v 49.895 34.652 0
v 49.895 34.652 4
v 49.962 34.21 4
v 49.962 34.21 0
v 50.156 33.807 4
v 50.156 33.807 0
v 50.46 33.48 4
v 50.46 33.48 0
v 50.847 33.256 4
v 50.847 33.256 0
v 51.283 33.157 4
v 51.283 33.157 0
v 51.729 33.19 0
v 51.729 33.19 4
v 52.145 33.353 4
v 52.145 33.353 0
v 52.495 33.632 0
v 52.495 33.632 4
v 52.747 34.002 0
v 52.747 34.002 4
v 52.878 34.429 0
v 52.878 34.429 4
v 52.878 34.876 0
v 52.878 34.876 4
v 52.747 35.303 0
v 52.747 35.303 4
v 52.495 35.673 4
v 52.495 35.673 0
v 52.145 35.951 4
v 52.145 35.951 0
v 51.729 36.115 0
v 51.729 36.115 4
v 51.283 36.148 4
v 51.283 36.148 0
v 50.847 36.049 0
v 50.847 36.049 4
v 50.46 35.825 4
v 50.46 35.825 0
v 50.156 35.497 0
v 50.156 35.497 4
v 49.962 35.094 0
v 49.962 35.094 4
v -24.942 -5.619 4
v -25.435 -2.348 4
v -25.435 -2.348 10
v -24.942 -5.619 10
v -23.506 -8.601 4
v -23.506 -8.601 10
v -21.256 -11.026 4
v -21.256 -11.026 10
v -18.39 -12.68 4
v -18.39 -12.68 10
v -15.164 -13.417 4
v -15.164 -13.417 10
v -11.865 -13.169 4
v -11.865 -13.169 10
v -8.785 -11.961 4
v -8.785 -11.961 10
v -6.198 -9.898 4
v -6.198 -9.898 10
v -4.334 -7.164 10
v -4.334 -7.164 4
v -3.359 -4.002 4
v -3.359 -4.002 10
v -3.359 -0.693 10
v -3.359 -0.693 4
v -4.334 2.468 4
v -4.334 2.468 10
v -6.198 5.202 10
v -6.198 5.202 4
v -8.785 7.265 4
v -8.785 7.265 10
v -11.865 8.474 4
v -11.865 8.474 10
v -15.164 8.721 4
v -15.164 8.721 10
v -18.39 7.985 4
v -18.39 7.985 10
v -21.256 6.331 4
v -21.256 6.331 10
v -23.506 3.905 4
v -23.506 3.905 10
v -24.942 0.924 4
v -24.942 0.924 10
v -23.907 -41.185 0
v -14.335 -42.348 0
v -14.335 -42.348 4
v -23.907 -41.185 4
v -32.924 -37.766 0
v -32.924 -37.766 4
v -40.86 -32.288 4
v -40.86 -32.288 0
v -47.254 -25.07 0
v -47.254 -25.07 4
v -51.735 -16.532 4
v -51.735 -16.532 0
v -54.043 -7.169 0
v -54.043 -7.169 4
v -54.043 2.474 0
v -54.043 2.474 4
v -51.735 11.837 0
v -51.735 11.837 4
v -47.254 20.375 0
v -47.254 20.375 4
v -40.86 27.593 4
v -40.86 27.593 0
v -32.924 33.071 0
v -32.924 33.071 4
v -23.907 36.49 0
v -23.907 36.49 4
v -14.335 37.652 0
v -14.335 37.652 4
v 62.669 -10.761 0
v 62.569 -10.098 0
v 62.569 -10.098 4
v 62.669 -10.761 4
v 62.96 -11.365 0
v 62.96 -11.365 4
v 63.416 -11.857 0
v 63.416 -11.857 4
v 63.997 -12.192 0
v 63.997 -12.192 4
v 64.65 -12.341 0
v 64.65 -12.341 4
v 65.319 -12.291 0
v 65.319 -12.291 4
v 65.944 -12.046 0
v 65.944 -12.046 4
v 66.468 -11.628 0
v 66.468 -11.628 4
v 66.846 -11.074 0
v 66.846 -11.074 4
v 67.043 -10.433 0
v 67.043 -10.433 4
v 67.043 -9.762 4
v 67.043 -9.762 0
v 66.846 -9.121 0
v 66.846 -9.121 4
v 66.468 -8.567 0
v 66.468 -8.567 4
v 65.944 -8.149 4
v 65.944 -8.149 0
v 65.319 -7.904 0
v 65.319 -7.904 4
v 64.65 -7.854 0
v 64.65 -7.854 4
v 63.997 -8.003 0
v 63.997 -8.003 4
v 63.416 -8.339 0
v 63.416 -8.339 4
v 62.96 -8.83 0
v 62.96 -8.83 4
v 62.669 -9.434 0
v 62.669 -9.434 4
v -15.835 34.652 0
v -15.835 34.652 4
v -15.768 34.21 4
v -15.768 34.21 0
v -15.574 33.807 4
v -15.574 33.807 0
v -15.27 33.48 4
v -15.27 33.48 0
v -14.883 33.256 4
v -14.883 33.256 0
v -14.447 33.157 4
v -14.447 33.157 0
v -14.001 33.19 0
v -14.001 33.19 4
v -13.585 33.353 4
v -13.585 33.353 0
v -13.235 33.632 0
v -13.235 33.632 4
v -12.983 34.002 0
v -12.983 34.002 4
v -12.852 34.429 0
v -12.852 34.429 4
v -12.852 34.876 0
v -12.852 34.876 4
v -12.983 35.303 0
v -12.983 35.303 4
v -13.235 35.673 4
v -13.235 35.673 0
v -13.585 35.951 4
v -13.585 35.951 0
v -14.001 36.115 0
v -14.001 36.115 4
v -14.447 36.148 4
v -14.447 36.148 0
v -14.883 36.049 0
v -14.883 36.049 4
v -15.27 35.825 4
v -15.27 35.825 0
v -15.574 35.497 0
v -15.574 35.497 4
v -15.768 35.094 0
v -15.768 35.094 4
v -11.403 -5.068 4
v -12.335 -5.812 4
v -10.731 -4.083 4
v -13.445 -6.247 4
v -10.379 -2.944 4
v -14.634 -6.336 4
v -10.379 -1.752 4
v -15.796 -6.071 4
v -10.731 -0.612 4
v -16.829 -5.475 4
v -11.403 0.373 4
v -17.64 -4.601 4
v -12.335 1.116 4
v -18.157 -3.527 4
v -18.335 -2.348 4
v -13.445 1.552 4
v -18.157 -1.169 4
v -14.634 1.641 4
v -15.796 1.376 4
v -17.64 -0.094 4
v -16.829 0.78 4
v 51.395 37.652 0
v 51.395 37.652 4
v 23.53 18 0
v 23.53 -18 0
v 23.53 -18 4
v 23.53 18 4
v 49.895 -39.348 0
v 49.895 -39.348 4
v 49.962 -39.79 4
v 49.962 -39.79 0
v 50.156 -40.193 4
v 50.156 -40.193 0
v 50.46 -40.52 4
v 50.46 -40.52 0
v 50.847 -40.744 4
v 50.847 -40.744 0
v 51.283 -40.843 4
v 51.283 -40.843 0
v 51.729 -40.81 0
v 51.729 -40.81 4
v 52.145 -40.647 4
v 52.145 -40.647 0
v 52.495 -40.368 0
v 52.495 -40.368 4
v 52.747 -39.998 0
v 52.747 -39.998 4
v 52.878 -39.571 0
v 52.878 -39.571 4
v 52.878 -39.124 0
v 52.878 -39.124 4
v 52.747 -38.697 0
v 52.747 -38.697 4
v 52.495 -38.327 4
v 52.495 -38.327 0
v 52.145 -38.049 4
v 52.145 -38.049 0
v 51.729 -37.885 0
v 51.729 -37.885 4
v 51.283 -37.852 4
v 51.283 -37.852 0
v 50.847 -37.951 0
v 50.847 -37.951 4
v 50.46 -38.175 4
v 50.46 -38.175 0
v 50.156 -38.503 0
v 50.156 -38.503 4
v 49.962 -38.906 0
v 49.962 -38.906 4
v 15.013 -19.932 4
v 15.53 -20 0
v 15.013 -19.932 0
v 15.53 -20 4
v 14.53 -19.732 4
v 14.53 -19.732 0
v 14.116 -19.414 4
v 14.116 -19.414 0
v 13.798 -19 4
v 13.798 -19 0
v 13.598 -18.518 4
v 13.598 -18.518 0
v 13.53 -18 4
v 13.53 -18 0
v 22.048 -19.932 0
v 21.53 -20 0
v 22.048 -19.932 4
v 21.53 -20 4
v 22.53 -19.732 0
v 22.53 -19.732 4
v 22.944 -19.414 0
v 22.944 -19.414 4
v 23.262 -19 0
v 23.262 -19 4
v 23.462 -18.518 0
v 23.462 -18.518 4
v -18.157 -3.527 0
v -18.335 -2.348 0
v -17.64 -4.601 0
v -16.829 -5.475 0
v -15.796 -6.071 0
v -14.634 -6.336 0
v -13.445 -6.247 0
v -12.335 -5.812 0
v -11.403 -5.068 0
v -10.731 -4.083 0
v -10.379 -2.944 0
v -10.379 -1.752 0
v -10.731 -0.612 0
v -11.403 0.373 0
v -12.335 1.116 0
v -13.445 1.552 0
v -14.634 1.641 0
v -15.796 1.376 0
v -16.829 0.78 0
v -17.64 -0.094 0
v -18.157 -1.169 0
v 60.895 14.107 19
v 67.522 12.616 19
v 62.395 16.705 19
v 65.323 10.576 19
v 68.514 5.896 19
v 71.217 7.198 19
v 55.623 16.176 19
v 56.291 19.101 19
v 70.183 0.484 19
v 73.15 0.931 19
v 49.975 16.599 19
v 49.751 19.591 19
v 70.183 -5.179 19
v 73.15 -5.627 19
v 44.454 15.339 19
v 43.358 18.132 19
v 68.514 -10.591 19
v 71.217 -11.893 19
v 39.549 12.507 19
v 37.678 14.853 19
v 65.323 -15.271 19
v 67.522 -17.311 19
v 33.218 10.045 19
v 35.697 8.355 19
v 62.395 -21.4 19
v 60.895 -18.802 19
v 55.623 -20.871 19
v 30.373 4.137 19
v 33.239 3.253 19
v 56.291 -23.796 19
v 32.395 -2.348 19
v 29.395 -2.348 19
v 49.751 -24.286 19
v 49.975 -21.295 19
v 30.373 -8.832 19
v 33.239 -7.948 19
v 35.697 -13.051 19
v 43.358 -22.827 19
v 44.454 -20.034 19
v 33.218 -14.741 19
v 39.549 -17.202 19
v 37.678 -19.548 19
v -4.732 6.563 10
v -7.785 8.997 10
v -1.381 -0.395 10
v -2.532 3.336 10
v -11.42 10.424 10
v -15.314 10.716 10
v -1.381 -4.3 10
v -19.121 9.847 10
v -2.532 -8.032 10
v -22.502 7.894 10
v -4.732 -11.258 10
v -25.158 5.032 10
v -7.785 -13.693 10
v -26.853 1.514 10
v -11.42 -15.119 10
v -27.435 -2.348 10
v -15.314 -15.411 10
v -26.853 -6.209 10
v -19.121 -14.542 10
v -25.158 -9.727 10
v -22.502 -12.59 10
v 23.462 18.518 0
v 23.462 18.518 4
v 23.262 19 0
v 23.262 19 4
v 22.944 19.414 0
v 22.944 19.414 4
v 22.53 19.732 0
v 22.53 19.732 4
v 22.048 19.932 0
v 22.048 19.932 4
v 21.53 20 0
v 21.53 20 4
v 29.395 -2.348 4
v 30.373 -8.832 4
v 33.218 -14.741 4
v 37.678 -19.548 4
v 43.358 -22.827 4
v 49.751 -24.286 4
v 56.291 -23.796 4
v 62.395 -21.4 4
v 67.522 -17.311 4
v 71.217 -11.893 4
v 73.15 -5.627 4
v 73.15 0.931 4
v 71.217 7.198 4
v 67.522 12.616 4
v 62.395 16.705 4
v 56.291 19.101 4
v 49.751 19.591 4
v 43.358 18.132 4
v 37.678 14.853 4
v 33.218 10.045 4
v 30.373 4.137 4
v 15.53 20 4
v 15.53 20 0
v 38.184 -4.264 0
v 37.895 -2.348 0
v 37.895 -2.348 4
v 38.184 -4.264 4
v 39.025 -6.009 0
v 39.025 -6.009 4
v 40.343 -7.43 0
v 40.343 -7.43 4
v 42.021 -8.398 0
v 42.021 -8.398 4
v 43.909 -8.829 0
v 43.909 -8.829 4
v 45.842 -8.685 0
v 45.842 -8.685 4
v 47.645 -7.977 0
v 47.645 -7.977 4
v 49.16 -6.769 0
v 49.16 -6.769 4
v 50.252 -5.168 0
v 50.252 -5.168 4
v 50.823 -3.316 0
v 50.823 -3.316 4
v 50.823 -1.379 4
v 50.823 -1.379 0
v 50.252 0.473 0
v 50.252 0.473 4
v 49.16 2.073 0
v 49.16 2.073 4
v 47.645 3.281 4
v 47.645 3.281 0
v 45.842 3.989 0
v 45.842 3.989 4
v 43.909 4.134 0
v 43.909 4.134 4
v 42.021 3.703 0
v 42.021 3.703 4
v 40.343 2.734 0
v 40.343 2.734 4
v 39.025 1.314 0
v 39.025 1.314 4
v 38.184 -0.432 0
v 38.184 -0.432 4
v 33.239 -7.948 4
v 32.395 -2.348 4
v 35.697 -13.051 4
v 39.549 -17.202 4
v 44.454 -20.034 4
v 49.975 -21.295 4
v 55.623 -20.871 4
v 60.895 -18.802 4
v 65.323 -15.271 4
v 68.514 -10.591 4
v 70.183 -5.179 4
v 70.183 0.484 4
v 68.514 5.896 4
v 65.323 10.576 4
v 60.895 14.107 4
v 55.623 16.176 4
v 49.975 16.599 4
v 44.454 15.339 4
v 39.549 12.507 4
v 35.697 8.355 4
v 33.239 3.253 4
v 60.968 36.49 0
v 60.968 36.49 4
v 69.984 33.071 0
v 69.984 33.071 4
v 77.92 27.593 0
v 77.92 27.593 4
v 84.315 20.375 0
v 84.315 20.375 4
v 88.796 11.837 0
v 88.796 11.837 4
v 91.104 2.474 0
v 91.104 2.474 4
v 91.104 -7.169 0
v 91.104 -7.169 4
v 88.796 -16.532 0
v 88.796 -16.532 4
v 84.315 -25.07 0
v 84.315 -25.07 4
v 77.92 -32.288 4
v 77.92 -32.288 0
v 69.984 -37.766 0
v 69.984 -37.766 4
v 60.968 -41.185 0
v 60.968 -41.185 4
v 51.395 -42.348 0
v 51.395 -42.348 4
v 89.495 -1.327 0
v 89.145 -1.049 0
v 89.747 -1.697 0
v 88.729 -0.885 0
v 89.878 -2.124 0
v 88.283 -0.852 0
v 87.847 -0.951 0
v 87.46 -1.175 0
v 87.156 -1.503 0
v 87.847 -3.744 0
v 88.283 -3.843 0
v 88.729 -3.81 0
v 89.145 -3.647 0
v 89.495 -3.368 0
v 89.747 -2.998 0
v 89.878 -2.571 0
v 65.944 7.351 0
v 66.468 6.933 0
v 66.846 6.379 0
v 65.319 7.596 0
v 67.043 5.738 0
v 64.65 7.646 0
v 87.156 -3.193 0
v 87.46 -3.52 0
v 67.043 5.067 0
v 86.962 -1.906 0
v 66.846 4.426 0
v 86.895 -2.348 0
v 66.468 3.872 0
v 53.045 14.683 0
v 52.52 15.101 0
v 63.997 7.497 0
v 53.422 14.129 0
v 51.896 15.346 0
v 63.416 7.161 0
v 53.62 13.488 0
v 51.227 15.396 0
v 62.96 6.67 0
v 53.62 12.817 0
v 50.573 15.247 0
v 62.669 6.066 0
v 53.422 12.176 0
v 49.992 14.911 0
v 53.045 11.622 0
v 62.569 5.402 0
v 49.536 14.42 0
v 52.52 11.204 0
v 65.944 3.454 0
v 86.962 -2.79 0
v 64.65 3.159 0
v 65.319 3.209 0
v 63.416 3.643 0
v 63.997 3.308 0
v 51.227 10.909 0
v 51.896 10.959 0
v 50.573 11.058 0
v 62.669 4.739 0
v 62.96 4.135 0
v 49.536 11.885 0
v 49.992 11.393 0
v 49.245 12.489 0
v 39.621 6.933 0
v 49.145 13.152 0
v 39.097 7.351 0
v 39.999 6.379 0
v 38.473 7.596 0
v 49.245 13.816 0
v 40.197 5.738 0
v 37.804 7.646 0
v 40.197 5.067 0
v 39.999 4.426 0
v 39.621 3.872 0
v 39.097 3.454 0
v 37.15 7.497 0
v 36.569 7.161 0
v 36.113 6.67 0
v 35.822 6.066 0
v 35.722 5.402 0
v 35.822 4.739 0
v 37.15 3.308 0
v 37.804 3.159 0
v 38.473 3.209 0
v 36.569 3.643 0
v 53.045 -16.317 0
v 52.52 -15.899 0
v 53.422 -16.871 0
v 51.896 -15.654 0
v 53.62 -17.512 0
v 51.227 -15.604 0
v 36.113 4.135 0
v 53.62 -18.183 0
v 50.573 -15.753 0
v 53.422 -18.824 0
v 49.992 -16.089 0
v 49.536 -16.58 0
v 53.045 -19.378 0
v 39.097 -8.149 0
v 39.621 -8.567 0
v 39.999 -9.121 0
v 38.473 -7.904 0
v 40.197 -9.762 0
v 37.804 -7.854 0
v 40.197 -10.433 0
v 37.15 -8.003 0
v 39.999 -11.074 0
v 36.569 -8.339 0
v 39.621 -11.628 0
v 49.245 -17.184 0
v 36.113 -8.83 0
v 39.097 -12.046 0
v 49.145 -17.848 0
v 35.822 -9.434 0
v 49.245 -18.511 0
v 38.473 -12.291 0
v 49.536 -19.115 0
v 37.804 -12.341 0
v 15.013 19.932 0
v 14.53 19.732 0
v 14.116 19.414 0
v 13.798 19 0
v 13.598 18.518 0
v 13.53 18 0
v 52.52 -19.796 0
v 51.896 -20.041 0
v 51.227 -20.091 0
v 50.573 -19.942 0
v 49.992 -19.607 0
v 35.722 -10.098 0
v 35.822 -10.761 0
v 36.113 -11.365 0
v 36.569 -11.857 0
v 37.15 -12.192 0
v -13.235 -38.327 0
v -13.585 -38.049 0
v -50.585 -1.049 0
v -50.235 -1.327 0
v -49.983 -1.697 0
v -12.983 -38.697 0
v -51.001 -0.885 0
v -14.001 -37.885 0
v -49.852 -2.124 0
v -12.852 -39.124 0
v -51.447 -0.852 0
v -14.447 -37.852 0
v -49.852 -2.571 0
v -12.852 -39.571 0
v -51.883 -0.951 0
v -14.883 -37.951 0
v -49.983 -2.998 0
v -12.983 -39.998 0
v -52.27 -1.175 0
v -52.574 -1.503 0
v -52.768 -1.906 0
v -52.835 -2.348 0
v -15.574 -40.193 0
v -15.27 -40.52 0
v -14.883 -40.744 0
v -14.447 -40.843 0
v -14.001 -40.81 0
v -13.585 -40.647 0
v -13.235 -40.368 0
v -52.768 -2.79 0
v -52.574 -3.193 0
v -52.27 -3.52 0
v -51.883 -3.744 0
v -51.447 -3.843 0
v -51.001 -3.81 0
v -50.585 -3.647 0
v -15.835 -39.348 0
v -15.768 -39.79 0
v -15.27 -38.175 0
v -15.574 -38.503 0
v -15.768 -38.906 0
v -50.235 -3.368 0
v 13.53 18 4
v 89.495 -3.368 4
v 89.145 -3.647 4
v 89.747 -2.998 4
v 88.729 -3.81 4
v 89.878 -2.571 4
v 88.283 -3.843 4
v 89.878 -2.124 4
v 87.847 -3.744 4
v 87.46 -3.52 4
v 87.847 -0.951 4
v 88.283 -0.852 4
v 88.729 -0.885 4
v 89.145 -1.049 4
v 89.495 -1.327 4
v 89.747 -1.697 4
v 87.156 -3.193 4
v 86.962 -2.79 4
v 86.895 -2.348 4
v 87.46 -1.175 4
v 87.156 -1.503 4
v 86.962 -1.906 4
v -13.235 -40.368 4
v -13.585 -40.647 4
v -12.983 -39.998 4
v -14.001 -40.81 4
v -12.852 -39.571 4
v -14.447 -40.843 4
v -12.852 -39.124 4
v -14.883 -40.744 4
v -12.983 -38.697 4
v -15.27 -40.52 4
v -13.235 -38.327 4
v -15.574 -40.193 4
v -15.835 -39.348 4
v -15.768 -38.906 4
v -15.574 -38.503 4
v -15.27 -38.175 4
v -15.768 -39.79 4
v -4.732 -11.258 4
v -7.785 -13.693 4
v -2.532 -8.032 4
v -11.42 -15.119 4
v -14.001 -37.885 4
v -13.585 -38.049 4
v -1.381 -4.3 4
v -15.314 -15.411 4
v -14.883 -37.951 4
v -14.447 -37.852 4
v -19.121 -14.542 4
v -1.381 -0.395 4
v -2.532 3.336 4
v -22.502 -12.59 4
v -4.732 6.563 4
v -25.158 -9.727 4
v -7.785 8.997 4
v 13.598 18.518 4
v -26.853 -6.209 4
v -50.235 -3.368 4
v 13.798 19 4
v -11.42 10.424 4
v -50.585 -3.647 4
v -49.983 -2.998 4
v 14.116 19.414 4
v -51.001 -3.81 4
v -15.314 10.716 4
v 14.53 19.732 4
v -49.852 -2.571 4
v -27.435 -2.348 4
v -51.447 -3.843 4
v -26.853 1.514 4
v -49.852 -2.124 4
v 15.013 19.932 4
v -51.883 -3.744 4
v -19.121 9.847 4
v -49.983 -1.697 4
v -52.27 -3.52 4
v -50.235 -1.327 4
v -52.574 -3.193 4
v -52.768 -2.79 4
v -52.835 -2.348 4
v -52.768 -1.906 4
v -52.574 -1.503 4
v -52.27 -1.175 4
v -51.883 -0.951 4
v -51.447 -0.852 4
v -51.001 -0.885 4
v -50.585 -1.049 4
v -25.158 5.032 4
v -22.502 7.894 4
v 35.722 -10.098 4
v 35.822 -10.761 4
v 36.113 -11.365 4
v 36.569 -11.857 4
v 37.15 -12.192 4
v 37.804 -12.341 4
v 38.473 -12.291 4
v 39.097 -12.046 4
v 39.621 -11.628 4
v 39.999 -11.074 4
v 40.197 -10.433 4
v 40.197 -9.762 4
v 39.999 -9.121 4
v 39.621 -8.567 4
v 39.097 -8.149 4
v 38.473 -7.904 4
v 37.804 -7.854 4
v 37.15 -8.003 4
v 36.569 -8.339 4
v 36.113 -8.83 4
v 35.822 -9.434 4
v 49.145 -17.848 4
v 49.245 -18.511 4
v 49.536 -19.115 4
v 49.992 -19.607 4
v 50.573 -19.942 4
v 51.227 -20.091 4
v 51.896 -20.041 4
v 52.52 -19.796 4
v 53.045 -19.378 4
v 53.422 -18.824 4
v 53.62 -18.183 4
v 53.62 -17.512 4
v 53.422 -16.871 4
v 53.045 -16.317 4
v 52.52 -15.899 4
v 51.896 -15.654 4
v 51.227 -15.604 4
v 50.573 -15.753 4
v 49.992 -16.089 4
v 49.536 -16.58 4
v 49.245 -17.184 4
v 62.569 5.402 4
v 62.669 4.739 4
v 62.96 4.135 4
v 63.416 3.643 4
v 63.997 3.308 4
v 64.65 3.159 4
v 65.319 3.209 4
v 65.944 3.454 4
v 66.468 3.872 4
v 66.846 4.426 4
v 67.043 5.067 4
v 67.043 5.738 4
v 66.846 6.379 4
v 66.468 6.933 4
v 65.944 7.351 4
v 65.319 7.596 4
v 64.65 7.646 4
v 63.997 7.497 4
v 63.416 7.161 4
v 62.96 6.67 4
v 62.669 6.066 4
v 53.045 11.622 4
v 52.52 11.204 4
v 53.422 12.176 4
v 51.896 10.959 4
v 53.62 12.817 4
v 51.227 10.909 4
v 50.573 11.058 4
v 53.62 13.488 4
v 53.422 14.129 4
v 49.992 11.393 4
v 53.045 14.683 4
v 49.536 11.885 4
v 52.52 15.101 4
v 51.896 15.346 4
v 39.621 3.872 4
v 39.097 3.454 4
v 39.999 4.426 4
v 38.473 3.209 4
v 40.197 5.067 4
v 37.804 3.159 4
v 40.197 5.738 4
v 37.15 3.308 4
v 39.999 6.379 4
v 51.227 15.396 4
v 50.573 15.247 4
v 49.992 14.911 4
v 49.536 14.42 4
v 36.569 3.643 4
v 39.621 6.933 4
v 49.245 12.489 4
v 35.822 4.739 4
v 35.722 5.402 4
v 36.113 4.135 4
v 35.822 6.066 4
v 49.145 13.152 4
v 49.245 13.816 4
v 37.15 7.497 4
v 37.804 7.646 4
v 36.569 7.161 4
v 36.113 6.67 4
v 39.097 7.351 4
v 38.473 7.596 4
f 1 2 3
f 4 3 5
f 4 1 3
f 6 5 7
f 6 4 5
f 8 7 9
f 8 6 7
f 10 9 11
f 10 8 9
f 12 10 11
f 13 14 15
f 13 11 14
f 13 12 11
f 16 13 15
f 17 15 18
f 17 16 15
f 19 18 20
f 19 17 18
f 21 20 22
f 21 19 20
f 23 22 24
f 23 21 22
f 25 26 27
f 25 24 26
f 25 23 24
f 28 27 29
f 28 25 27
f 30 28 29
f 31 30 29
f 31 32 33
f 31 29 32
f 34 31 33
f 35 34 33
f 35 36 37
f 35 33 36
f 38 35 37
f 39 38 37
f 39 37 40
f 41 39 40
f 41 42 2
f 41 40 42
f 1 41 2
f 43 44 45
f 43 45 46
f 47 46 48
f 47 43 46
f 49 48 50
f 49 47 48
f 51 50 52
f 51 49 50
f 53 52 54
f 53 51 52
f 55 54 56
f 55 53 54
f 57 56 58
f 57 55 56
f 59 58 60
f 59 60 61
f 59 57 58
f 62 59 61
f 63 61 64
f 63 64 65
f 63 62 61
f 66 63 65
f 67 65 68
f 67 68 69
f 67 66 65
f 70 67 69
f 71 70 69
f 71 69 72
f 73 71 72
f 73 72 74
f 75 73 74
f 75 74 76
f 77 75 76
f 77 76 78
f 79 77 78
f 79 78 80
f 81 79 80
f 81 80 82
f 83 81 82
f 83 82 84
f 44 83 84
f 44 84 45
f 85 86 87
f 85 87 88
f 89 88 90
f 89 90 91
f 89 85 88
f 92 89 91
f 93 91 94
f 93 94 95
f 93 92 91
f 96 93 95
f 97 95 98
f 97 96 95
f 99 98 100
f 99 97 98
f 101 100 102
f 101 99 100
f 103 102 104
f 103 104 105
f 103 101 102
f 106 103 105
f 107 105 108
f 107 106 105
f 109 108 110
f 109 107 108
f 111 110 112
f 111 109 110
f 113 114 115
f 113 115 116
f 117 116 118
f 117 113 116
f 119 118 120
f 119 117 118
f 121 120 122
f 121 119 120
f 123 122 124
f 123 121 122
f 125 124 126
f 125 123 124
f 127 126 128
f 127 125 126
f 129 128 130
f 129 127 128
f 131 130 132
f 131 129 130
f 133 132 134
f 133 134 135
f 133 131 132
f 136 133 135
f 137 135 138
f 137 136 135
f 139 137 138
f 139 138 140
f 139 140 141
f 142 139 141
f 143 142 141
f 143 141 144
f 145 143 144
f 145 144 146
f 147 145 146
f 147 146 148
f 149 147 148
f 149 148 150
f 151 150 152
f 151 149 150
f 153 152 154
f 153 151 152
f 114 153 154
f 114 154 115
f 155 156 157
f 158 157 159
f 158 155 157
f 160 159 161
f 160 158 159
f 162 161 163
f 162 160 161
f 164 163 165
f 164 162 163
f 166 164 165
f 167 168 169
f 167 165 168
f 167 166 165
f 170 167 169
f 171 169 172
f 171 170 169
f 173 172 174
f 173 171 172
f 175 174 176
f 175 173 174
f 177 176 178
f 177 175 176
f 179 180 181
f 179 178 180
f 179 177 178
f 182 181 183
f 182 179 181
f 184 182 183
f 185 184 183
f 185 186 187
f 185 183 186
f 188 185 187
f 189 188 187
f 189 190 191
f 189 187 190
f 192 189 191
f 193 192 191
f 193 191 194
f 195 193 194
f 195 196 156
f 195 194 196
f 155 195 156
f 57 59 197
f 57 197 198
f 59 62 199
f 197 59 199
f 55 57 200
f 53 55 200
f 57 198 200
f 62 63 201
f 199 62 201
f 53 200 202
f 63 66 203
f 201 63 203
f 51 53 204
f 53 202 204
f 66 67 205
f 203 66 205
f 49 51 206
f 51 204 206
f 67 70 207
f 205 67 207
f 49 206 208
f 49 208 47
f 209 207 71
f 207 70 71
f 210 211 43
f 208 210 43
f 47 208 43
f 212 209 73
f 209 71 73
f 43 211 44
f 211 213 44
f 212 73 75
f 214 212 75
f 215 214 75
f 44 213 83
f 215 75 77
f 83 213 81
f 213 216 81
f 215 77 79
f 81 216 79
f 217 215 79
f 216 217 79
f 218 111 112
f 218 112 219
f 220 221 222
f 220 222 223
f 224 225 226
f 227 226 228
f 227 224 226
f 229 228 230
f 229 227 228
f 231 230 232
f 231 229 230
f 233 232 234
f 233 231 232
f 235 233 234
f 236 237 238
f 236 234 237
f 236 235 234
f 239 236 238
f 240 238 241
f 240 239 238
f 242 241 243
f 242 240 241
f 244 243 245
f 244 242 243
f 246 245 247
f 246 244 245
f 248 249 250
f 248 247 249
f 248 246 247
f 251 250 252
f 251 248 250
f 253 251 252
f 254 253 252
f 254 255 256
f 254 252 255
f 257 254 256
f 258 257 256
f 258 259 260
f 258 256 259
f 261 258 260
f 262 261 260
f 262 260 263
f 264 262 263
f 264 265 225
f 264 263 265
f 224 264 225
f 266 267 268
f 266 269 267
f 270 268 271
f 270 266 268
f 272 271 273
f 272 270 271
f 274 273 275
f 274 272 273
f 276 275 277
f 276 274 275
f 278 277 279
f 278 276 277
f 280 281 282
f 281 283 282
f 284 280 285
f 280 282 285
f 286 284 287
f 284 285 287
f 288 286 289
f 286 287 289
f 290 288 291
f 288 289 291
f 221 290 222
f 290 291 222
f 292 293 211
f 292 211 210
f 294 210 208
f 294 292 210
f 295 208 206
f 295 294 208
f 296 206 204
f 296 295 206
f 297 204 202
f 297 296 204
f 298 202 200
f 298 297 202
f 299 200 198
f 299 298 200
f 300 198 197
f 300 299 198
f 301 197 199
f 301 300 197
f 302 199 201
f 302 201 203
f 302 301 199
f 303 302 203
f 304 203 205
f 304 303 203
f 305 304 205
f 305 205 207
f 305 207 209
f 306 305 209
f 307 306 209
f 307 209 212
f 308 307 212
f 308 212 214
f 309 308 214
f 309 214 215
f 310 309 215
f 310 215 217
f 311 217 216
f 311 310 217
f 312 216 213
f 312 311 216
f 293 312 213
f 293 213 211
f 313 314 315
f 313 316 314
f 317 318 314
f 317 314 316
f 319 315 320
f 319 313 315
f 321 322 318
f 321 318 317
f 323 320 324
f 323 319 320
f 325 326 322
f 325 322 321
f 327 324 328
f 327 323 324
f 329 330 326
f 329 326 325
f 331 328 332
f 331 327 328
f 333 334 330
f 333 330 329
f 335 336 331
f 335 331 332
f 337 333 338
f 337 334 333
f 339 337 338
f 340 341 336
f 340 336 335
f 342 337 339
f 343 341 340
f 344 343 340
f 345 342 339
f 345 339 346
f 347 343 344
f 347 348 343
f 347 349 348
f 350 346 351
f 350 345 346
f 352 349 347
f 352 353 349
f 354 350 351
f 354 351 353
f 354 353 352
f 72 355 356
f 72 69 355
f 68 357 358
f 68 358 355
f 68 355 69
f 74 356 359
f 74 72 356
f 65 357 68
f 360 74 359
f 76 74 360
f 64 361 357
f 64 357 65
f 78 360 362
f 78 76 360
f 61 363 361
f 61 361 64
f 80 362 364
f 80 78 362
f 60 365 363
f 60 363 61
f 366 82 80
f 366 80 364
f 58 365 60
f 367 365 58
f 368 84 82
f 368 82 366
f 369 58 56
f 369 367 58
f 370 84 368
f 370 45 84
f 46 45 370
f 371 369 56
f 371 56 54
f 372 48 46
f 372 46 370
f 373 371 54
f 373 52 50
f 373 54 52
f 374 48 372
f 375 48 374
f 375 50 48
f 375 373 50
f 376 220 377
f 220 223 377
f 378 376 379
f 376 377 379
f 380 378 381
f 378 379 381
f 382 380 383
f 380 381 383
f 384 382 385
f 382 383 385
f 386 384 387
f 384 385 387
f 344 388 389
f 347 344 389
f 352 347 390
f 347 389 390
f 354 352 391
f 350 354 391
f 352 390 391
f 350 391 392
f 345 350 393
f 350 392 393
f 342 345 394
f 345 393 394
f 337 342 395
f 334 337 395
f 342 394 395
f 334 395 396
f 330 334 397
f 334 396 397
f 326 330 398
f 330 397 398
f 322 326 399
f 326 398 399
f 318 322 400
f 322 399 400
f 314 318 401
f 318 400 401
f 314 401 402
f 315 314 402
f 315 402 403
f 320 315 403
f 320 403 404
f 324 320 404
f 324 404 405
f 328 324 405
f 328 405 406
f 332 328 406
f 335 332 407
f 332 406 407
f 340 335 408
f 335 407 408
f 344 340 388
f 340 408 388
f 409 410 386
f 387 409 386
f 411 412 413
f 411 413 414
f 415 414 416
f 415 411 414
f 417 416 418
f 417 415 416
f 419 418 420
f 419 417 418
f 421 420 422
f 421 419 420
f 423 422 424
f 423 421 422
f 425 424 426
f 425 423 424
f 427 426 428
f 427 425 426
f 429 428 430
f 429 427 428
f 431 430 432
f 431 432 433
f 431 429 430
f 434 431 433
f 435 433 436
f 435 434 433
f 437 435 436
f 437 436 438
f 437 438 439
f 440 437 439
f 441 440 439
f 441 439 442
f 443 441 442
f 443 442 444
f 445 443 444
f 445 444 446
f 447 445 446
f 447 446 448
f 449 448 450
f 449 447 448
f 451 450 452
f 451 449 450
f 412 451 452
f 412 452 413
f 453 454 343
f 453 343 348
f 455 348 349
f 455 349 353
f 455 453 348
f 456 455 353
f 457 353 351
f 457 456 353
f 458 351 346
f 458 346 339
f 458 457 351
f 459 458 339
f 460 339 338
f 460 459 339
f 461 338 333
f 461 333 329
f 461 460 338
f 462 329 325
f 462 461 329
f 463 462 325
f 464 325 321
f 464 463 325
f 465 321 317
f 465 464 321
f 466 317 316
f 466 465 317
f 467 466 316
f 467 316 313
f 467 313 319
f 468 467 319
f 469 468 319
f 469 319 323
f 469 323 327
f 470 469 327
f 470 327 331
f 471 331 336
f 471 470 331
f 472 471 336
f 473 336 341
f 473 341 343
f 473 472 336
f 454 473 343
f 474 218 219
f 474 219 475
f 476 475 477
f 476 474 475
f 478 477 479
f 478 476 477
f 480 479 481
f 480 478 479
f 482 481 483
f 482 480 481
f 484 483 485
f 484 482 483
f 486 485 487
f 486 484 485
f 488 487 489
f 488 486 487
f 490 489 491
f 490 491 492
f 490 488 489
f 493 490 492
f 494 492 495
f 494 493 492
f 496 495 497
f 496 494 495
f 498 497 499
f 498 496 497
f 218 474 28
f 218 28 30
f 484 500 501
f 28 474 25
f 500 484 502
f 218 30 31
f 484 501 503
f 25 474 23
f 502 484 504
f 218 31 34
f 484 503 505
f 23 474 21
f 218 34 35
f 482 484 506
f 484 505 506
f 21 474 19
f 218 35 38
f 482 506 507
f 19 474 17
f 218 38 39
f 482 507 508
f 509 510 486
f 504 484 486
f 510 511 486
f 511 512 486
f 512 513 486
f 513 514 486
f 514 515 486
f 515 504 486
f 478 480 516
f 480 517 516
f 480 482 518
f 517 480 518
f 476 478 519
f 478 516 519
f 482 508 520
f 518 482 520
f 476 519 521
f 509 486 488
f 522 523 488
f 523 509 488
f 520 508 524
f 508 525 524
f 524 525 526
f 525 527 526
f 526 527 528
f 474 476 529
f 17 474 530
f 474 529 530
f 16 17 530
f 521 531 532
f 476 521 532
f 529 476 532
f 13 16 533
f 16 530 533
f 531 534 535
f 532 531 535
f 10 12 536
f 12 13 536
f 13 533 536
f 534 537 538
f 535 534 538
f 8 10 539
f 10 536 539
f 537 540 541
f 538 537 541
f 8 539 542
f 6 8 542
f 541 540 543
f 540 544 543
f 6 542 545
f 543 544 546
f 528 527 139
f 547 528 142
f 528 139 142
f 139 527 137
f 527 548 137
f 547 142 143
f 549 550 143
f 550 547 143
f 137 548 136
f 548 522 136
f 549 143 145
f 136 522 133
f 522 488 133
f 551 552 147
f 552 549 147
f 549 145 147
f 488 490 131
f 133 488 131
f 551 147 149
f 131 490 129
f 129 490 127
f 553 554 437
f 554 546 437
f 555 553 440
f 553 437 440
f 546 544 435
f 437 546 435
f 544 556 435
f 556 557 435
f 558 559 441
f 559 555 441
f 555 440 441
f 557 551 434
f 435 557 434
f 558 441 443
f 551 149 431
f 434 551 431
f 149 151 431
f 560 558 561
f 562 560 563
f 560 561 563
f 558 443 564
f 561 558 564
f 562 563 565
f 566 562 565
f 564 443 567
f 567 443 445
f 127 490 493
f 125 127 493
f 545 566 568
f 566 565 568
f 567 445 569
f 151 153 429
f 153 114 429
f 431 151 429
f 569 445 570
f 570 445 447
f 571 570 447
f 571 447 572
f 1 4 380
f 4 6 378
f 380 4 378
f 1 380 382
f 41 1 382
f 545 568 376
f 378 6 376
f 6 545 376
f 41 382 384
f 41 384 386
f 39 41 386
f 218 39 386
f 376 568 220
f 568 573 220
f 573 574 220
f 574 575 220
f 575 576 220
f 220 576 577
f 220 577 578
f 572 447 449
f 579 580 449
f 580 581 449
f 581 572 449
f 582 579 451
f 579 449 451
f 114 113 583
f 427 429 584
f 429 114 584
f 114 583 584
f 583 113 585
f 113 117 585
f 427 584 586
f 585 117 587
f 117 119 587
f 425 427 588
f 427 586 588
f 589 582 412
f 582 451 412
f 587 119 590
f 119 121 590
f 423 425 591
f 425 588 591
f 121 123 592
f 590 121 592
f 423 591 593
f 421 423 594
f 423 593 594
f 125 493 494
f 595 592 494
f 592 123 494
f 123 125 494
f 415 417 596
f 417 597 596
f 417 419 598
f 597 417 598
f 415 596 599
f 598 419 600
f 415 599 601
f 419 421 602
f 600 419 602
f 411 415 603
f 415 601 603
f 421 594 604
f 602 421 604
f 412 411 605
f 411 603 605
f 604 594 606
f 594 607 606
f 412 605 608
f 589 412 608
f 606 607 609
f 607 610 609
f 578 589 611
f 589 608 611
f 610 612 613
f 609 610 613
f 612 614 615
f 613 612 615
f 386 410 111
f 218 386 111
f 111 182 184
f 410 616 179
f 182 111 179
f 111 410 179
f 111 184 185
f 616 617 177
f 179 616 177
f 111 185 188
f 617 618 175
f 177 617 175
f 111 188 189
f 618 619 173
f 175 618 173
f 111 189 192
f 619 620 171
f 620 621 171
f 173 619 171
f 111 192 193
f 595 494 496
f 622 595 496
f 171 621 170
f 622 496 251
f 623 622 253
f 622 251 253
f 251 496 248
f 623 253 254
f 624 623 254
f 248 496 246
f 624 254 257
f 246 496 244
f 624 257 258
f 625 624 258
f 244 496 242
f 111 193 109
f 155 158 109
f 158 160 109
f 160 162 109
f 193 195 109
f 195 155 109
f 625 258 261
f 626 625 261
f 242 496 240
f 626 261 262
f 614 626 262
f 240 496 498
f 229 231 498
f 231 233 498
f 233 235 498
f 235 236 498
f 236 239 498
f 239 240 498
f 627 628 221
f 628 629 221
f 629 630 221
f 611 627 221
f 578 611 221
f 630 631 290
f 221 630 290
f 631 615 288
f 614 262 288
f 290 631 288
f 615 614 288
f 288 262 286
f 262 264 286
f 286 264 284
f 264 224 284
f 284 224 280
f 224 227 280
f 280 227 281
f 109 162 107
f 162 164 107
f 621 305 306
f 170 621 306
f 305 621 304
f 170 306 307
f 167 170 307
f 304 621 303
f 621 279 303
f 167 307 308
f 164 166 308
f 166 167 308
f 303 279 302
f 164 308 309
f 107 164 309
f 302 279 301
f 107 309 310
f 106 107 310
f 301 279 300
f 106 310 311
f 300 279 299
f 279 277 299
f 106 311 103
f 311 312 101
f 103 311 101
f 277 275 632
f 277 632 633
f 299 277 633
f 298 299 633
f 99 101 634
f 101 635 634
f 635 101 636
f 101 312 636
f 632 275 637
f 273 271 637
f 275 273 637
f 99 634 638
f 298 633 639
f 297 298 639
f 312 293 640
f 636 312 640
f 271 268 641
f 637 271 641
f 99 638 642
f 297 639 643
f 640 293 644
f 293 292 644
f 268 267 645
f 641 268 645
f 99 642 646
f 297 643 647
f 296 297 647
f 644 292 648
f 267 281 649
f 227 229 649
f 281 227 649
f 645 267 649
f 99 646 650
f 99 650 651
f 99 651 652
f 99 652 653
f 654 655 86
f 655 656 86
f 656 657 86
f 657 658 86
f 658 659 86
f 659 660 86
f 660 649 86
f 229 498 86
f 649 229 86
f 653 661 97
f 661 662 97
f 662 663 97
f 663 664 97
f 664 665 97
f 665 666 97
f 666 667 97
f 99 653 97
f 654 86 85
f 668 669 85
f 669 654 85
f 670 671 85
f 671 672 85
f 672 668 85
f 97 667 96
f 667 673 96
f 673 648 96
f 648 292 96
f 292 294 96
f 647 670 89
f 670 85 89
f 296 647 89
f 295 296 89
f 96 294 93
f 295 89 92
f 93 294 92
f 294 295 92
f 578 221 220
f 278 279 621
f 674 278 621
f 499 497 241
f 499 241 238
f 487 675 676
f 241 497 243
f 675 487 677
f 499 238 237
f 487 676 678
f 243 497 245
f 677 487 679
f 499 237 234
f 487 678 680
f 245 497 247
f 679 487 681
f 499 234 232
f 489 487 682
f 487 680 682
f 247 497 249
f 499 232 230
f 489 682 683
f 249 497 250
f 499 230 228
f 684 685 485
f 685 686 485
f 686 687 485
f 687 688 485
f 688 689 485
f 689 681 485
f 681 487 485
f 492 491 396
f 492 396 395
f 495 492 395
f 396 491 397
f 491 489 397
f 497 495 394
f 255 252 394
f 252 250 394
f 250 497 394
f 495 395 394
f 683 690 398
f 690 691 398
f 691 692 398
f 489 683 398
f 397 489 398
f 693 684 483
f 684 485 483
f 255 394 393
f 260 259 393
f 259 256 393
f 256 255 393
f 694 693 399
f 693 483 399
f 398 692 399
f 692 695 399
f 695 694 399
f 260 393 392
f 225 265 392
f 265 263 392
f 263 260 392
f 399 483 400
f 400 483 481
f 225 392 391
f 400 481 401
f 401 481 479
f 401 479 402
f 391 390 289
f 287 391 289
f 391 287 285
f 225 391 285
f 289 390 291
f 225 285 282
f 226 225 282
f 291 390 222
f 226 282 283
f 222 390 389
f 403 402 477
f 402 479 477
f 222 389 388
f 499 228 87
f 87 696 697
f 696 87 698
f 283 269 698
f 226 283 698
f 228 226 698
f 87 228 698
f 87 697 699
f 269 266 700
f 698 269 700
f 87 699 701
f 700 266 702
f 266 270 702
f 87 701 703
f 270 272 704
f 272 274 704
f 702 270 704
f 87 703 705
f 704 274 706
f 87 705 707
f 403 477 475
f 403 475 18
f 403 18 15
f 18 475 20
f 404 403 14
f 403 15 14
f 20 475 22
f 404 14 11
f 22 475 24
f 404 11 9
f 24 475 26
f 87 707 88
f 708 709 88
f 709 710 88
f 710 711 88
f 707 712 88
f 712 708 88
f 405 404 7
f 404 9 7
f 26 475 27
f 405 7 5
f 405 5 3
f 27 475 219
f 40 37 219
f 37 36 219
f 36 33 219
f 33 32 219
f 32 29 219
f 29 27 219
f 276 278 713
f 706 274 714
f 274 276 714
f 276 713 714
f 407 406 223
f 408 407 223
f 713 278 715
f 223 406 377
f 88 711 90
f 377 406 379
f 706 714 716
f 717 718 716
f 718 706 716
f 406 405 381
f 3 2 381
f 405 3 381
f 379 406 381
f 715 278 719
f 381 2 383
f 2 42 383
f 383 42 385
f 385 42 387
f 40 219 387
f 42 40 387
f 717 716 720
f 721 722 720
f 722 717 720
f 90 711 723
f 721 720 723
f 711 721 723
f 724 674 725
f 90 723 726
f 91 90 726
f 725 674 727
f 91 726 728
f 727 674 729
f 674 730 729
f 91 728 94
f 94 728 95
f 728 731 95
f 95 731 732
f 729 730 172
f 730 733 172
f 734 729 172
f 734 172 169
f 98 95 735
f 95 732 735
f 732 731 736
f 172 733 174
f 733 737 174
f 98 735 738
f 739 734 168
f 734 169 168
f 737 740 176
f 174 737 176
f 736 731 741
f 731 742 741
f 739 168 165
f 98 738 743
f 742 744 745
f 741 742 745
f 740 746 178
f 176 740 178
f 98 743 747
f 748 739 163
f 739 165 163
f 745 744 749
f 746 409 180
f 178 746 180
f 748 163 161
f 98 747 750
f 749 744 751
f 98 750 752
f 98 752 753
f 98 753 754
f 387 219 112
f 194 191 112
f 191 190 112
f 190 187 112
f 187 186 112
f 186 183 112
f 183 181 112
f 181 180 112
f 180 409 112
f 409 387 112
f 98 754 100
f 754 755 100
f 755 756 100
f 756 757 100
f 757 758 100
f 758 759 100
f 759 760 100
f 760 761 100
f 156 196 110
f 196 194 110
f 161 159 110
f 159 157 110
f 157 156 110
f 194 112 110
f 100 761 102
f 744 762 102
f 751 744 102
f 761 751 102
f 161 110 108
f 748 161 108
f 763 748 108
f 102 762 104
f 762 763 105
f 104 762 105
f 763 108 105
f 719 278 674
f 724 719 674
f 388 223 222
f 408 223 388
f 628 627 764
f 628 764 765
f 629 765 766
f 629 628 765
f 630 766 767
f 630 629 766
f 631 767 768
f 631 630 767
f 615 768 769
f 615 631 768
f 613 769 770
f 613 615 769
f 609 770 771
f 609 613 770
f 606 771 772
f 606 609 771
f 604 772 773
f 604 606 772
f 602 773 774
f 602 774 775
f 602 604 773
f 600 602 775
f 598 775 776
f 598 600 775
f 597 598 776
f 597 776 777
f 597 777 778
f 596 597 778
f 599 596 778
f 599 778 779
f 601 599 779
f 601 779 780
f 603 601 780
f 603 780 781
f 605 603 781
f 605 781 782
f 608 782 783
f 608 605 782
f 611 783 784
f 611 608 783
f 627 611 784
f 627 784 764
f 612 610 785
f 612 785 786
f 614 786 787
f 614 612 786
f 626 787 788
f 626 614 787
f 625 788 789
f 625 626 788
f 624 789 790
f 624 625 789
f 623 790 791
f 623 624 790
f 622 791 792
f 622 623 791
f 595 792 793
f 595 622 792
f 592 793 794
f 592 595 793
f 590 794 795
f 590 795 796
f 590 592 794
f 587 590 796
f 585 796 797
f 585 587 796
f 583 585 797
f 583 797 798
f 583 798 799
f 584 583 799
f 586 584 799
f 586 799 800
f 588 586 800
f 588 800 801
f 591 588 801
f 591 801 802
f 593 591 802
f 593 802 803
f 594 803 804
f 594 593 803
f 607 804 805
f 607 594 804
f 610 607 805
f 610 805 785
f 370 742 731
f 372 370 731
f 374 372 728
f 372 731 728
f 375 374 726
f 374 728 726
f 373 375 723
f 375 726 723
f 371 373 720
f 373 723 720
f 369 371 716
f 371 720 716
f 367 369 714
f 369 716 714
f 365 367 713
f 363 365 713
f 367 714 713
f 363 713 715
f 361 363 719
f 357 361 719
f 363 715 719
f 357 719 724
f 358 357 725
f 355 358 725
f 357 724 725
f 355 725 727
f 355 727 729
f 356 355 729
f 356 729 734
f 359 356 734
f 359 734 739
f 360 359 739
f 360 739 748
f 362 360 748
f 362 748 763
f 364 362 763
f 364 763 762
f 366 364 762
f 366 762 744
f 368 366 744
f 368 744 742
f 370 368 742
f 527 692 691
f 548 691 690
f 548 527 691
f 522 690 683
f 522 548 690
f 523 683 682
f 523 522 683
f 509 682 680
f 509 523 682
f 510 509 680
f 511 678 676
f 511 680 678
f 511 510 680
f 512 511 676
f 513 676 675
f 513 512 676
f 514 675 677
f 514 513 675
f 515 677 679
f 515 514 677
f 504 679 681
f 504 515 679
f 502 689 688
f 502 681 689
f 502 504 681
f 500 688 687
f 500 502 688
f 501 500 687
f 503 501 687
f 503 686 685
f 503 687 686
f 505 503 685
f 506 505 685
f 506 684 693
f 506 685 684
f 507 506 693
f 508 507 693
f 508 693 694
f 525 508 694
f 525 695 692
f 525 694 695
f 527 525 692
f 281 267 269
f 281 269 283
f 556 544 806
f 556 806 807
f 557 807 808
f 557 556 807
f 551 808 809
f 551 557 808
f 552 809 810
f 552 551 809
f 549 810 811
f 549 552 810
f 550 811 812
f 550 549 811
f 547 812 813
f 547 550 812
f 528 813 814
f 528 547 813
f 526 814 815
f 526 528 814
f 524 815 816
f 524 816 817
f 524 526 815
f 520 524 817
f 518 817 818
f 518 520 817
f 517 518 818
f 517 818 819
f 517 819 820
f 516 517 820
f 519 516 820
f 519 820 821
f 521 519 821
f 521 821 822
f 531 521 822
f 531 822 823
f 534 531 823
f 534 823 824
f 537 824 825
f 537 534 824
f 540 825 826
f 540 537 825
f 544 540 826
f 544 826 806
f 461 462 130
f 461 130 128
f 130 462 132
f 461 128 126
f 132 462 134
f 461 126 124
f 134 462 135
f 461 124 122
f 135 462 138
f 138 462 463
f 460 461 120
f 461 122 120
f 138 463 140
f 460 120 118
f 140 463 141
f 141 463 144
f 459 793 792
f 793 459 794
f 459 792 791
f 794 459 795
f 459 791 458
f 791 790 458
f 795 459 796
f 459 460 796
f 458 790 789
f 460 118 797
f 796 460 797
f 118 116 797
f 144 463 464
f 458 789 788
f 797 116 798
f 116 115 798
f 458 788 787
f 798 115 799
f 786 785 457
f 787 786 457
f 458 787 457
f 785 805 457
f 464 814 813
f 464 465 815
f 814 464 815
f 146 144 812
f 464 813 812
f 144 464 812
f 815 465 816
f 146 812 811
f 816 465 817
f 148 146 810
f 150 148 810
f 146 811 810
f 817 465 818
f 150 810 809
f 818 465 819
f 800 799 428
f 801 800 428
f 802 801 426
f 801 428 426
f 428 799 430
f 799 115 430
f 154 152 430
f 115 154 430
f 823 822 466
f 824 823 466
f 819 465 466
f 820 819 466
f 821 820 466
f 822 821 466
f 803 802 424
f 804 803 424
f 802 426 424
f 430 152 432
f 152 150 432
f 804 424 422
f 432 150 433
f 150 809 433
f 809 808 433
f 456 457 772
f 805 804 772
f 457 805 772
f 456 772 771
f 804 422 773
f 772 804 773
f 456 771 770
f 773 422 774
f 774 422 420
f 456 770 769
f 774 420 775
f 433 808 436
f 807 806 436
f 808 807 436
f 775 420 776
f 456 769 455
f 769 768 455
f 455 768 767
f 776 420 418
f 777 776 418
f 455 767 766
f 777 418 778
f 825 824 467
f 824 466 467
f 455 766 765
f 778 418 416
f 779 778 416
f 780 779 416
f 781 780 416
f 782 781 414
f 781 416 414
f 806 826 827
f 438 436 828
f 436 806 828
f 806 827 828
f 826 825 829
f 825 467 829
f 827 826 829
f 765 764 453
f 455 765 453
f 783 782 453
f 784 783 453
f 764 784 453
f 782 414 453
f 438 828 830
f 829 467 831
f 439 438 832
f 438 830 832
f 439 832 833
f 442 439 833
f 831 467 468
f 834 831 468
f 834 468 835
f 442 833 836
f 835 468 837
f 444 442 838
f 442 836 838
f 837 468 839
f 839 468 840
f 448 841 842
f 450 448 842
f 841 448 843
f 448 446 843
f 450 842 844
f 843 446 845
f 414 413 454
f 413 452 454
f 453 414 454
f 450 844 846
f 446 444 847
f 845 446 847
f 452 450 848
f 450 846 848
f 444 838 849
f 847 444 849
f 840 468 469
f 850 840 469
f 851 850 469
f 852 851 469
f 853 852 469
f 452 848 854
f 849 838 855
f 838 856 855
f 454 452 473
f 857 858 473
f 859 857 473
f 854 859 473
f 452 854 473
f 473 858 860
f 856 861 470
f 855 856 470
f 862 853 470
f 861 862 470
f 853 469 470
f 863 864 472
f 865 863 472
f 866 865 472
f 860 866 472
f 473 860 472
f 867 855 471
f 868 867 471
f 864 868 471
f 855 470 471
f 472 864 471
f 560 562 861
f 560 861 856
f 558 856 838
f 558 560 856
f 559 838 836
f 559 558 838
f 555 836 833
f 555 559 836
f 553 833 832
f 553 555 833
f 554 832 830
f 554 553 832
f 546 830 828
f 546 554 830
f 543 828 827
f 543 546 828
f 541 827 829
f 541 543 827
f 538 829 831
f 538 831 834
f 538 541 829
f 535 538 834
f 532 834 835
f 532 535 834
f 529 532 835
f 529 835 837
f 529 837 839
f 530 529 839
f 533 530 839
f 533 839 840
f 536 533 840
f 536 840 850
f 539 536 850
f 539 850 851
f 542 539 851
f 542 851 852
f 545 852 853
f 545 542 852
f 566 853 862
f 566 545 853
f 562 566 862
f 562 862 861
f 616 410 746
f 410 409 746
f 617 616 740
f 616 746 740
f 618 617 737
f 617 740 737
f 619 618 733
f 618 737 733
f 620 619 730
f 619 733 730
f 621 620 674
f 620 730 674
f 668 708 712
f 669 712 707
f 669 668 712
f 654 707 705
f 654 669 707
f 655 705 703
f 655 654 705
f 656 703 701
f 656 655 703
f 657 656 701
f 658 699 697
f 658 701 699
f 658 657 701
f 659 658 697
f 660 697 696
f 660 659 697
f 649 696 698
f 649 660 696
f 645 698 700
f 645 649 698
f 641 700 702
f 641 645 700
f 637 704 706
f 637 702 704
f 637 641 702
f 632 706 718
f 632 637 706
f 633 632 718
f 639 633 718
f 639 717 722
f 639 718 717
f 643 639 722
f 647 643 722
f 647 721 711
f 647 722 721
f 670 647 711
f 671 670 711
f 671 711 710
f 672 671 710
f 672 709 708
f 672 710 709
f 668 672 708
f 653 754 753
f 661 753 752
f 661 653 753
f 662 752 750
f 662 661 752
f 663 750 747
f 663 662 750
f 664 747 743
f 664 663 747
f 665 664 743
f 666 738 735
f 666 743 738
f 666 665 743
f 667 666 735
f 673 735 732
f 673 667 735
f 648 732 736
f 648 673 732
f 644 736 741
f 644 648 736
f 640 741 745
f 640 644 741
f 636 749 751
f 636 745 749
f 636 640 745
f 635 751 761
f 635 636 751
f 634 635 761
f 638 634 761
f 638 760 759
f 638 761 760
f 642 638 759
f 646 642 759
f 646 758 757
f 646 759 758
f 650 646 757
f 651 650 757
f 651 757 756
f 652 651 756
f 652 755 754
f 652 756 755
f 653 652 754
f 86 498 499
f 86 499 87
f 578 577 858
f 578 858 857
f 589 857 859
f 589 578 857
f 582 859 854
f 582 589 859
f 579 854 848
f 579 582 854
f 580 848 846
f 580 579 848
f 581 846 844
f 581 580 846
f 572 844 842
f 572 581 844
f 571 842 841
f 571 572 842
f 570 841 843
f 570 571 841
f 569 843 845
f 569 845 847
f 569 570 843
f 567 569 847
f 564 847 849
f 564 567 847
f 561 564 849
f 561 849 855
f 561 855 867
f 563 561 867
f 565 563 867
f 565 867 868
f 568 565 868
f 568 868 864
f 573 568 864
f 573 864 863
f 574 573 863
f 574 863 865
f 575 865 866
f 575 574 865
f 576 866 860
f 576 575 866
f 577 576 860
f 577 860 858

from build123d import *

# Parameters (mm, degrees)
BOSS_EXTRUDE1_DEPTH = 4
SKETCH2_R           = 6.5
SKETCH2_R_2         = 2.25
SKETCH2_R_3         = 4
CUT_EXTRUDE1_DEPTH  = 4
BOSS_EXTRUDE2_START = 4
SKETCH3_R           = 22
SKETCH3_R_2         = 19
BOSS_EXTRUDE2_DEPTH = 15
SKETCH4_R           = 13.1
SKETCH4_R_2         = 11.1
BOSS_EXTRUDE3_DEPTH = 10
SKETCH5_R           = 1.5
CUT_EXTRUDE2_DEPTH  = 103.505675922
SKETCH6_W           = 10
SKETCH6_H           = 40
CUT_EXTRUDE3_DEPTH  = 103.505675922
FILLET1_R           = 2


with BuildPart() as part:
    # Sketch1 → Boss-Extrude1 (new body)
    with BuildSketch(Plane.XY):
        with BuildLine():
            Line((-14.334769336, 37.652327005), (51.395230664, 37.652327005))
            ThreePointArc((51.395230664, 37.652327005), (91.395230664, -2.347672995), (51.395230664, -42.347672995))
            Line((51.395230664, -42.347672995), (-14.334769336, -42.347672995))
            ThreePointArc((-14.334769336, -42.347672995), (-54.334769336, -2.347672995), (-14.334769336, 37.652327005))
        make_face()
    extrude(amount=BOSS_EXTRUDE1_DEPTH)

    # Sketch2 → Cut-Extrude1 (cut)
    with BuildSketch(Plane.XY):
        with Locations(Location((44.395230664, -2.347672995, 0), (0, 0, 180))):
            Circle(SKETCH2_R)
        with Locations(Location((51.395230664, 13.152327005, 0), (0, 0, 180))):
            Circle(SKETCH2_R_2)
        with Locations(Location((64.818624423, 5.402327005, 0), (0, 0, 180))):
            Circle(SKETCH2_R_2)
        with Locations(Location((64.818624423, -10.097672995, 0), (0, 0, 180))):
            Circle(SKETCH2_R_2)
        with Locations(Location((51.395230664, -17.847672995, 0), (0, 0, 180))):
            Circle(SKETCH2_R_2)
        with Locations(Location((37.971836906, -10.097672995, 0), (0, 0, 180))):
            Circle(SKETCH2_R_2)
        with Locations(Location((37.971836906, 5.402327005, 0), (0, 0, 180))):
            Circle(SKETCH2_R_2)
        with Locations(Location((-14.334769336, -2.347672995, 0), (0, 0, 180))):
            Circle(SKETCH2_R_3)
    extrude(amount=CUT_EXTRUDE1_DEPTH, mode=Mode.SUBTRACT)

    # Sketch3 → Boss-Extrude2 (add)
    with BuildSketch(Plane.XY.offset(BOSS_EXTRUDE2_START)):
        with Locations(Location((51.395230664, -2.347672995, 0), (0, 0, 180))):
            Circle(SKETCH3_R)
        with Locations(Location((51.395230664, -2.347672995, 0), (0, 0, 180))):
            Circle(SKETCH3_R_2, mode=Mode.SUBTRACT)
    extrude(amount=BOSS_EXTRUDE2_DEPTH)

    # Sketch4 → Boss-Extrude3 (add)
    with BuildSketch(Plane.XY):
        with Locations(Location((-14.334769336, -2.347672995, 0), (0, 0, 180))):
            Circle(SKETCH4_R)
        with Locations(Location((-14.334769336, -2.347672995, 0), (0, 0, 180))):
            Circle(SKETCH4_R_2, mode=Mode.SUBTRACT)
    extrude(amount=BOSS_EXTRUDE3_DEPTH)

    # Sketch5 → Cut-Extrude2 (cut, through all)
    with BuildSketch(Plane.XY):
        with Locations(Location((88.395230664, -2.347672995, 0), (0, 0, 180))):
            Circle(SKETCH5_R)
        with Locations(Location((-51.334769336, -2.347672995, 0), (0, 0, 180))):
            Circle(SKETCH5_R)
        with Locations(Location((51.395230664, 34.652327005, 0), (0, 0, 180))):
            Circle(SKETCH5_R)
        with Locations(Location((51.395230664, -39.347672995, 0), (0, 0, 180))):
            Circle(SKETCH5_R)
        with Locations(Location((-14.334769336, -39.347672995, 0), (0, 0, 180))):
            Circle(SKETCH5_R)
        with Locations(Location((-14.334769336, 34.652327005, 0), (0, 0, 180))):
            Circle(SKETCH5_R)
    extrude(amount=CUT_EXTRUDE2_DEPTH, mode=Mode.SUBTRACT)

    # Sketch6 → Cut-Extrude3 (cut, through all)
    with BuildSketch(Plane.XY):
        with Locations((18.530230664, 0)):
            Rectangle(SKETCH6_W, SKETCH6_H)
    extrude(amount=CUT_EXTRUDE3_DEPTH, mode=Mode.SUBTRACT)

    # Fillet1
    fillet1_edges = [part.edges().sort_by_distance(p)[0] for p in [
        (23.530230664, -20, 2),
        (23.530230664, 20, 2),
        (13.530230664, 20, 2),
        (13.530230664, -20, 2),
    ]]
    fillet(fillet1_edges, radius=FILLET1_R)


solid = part.part
